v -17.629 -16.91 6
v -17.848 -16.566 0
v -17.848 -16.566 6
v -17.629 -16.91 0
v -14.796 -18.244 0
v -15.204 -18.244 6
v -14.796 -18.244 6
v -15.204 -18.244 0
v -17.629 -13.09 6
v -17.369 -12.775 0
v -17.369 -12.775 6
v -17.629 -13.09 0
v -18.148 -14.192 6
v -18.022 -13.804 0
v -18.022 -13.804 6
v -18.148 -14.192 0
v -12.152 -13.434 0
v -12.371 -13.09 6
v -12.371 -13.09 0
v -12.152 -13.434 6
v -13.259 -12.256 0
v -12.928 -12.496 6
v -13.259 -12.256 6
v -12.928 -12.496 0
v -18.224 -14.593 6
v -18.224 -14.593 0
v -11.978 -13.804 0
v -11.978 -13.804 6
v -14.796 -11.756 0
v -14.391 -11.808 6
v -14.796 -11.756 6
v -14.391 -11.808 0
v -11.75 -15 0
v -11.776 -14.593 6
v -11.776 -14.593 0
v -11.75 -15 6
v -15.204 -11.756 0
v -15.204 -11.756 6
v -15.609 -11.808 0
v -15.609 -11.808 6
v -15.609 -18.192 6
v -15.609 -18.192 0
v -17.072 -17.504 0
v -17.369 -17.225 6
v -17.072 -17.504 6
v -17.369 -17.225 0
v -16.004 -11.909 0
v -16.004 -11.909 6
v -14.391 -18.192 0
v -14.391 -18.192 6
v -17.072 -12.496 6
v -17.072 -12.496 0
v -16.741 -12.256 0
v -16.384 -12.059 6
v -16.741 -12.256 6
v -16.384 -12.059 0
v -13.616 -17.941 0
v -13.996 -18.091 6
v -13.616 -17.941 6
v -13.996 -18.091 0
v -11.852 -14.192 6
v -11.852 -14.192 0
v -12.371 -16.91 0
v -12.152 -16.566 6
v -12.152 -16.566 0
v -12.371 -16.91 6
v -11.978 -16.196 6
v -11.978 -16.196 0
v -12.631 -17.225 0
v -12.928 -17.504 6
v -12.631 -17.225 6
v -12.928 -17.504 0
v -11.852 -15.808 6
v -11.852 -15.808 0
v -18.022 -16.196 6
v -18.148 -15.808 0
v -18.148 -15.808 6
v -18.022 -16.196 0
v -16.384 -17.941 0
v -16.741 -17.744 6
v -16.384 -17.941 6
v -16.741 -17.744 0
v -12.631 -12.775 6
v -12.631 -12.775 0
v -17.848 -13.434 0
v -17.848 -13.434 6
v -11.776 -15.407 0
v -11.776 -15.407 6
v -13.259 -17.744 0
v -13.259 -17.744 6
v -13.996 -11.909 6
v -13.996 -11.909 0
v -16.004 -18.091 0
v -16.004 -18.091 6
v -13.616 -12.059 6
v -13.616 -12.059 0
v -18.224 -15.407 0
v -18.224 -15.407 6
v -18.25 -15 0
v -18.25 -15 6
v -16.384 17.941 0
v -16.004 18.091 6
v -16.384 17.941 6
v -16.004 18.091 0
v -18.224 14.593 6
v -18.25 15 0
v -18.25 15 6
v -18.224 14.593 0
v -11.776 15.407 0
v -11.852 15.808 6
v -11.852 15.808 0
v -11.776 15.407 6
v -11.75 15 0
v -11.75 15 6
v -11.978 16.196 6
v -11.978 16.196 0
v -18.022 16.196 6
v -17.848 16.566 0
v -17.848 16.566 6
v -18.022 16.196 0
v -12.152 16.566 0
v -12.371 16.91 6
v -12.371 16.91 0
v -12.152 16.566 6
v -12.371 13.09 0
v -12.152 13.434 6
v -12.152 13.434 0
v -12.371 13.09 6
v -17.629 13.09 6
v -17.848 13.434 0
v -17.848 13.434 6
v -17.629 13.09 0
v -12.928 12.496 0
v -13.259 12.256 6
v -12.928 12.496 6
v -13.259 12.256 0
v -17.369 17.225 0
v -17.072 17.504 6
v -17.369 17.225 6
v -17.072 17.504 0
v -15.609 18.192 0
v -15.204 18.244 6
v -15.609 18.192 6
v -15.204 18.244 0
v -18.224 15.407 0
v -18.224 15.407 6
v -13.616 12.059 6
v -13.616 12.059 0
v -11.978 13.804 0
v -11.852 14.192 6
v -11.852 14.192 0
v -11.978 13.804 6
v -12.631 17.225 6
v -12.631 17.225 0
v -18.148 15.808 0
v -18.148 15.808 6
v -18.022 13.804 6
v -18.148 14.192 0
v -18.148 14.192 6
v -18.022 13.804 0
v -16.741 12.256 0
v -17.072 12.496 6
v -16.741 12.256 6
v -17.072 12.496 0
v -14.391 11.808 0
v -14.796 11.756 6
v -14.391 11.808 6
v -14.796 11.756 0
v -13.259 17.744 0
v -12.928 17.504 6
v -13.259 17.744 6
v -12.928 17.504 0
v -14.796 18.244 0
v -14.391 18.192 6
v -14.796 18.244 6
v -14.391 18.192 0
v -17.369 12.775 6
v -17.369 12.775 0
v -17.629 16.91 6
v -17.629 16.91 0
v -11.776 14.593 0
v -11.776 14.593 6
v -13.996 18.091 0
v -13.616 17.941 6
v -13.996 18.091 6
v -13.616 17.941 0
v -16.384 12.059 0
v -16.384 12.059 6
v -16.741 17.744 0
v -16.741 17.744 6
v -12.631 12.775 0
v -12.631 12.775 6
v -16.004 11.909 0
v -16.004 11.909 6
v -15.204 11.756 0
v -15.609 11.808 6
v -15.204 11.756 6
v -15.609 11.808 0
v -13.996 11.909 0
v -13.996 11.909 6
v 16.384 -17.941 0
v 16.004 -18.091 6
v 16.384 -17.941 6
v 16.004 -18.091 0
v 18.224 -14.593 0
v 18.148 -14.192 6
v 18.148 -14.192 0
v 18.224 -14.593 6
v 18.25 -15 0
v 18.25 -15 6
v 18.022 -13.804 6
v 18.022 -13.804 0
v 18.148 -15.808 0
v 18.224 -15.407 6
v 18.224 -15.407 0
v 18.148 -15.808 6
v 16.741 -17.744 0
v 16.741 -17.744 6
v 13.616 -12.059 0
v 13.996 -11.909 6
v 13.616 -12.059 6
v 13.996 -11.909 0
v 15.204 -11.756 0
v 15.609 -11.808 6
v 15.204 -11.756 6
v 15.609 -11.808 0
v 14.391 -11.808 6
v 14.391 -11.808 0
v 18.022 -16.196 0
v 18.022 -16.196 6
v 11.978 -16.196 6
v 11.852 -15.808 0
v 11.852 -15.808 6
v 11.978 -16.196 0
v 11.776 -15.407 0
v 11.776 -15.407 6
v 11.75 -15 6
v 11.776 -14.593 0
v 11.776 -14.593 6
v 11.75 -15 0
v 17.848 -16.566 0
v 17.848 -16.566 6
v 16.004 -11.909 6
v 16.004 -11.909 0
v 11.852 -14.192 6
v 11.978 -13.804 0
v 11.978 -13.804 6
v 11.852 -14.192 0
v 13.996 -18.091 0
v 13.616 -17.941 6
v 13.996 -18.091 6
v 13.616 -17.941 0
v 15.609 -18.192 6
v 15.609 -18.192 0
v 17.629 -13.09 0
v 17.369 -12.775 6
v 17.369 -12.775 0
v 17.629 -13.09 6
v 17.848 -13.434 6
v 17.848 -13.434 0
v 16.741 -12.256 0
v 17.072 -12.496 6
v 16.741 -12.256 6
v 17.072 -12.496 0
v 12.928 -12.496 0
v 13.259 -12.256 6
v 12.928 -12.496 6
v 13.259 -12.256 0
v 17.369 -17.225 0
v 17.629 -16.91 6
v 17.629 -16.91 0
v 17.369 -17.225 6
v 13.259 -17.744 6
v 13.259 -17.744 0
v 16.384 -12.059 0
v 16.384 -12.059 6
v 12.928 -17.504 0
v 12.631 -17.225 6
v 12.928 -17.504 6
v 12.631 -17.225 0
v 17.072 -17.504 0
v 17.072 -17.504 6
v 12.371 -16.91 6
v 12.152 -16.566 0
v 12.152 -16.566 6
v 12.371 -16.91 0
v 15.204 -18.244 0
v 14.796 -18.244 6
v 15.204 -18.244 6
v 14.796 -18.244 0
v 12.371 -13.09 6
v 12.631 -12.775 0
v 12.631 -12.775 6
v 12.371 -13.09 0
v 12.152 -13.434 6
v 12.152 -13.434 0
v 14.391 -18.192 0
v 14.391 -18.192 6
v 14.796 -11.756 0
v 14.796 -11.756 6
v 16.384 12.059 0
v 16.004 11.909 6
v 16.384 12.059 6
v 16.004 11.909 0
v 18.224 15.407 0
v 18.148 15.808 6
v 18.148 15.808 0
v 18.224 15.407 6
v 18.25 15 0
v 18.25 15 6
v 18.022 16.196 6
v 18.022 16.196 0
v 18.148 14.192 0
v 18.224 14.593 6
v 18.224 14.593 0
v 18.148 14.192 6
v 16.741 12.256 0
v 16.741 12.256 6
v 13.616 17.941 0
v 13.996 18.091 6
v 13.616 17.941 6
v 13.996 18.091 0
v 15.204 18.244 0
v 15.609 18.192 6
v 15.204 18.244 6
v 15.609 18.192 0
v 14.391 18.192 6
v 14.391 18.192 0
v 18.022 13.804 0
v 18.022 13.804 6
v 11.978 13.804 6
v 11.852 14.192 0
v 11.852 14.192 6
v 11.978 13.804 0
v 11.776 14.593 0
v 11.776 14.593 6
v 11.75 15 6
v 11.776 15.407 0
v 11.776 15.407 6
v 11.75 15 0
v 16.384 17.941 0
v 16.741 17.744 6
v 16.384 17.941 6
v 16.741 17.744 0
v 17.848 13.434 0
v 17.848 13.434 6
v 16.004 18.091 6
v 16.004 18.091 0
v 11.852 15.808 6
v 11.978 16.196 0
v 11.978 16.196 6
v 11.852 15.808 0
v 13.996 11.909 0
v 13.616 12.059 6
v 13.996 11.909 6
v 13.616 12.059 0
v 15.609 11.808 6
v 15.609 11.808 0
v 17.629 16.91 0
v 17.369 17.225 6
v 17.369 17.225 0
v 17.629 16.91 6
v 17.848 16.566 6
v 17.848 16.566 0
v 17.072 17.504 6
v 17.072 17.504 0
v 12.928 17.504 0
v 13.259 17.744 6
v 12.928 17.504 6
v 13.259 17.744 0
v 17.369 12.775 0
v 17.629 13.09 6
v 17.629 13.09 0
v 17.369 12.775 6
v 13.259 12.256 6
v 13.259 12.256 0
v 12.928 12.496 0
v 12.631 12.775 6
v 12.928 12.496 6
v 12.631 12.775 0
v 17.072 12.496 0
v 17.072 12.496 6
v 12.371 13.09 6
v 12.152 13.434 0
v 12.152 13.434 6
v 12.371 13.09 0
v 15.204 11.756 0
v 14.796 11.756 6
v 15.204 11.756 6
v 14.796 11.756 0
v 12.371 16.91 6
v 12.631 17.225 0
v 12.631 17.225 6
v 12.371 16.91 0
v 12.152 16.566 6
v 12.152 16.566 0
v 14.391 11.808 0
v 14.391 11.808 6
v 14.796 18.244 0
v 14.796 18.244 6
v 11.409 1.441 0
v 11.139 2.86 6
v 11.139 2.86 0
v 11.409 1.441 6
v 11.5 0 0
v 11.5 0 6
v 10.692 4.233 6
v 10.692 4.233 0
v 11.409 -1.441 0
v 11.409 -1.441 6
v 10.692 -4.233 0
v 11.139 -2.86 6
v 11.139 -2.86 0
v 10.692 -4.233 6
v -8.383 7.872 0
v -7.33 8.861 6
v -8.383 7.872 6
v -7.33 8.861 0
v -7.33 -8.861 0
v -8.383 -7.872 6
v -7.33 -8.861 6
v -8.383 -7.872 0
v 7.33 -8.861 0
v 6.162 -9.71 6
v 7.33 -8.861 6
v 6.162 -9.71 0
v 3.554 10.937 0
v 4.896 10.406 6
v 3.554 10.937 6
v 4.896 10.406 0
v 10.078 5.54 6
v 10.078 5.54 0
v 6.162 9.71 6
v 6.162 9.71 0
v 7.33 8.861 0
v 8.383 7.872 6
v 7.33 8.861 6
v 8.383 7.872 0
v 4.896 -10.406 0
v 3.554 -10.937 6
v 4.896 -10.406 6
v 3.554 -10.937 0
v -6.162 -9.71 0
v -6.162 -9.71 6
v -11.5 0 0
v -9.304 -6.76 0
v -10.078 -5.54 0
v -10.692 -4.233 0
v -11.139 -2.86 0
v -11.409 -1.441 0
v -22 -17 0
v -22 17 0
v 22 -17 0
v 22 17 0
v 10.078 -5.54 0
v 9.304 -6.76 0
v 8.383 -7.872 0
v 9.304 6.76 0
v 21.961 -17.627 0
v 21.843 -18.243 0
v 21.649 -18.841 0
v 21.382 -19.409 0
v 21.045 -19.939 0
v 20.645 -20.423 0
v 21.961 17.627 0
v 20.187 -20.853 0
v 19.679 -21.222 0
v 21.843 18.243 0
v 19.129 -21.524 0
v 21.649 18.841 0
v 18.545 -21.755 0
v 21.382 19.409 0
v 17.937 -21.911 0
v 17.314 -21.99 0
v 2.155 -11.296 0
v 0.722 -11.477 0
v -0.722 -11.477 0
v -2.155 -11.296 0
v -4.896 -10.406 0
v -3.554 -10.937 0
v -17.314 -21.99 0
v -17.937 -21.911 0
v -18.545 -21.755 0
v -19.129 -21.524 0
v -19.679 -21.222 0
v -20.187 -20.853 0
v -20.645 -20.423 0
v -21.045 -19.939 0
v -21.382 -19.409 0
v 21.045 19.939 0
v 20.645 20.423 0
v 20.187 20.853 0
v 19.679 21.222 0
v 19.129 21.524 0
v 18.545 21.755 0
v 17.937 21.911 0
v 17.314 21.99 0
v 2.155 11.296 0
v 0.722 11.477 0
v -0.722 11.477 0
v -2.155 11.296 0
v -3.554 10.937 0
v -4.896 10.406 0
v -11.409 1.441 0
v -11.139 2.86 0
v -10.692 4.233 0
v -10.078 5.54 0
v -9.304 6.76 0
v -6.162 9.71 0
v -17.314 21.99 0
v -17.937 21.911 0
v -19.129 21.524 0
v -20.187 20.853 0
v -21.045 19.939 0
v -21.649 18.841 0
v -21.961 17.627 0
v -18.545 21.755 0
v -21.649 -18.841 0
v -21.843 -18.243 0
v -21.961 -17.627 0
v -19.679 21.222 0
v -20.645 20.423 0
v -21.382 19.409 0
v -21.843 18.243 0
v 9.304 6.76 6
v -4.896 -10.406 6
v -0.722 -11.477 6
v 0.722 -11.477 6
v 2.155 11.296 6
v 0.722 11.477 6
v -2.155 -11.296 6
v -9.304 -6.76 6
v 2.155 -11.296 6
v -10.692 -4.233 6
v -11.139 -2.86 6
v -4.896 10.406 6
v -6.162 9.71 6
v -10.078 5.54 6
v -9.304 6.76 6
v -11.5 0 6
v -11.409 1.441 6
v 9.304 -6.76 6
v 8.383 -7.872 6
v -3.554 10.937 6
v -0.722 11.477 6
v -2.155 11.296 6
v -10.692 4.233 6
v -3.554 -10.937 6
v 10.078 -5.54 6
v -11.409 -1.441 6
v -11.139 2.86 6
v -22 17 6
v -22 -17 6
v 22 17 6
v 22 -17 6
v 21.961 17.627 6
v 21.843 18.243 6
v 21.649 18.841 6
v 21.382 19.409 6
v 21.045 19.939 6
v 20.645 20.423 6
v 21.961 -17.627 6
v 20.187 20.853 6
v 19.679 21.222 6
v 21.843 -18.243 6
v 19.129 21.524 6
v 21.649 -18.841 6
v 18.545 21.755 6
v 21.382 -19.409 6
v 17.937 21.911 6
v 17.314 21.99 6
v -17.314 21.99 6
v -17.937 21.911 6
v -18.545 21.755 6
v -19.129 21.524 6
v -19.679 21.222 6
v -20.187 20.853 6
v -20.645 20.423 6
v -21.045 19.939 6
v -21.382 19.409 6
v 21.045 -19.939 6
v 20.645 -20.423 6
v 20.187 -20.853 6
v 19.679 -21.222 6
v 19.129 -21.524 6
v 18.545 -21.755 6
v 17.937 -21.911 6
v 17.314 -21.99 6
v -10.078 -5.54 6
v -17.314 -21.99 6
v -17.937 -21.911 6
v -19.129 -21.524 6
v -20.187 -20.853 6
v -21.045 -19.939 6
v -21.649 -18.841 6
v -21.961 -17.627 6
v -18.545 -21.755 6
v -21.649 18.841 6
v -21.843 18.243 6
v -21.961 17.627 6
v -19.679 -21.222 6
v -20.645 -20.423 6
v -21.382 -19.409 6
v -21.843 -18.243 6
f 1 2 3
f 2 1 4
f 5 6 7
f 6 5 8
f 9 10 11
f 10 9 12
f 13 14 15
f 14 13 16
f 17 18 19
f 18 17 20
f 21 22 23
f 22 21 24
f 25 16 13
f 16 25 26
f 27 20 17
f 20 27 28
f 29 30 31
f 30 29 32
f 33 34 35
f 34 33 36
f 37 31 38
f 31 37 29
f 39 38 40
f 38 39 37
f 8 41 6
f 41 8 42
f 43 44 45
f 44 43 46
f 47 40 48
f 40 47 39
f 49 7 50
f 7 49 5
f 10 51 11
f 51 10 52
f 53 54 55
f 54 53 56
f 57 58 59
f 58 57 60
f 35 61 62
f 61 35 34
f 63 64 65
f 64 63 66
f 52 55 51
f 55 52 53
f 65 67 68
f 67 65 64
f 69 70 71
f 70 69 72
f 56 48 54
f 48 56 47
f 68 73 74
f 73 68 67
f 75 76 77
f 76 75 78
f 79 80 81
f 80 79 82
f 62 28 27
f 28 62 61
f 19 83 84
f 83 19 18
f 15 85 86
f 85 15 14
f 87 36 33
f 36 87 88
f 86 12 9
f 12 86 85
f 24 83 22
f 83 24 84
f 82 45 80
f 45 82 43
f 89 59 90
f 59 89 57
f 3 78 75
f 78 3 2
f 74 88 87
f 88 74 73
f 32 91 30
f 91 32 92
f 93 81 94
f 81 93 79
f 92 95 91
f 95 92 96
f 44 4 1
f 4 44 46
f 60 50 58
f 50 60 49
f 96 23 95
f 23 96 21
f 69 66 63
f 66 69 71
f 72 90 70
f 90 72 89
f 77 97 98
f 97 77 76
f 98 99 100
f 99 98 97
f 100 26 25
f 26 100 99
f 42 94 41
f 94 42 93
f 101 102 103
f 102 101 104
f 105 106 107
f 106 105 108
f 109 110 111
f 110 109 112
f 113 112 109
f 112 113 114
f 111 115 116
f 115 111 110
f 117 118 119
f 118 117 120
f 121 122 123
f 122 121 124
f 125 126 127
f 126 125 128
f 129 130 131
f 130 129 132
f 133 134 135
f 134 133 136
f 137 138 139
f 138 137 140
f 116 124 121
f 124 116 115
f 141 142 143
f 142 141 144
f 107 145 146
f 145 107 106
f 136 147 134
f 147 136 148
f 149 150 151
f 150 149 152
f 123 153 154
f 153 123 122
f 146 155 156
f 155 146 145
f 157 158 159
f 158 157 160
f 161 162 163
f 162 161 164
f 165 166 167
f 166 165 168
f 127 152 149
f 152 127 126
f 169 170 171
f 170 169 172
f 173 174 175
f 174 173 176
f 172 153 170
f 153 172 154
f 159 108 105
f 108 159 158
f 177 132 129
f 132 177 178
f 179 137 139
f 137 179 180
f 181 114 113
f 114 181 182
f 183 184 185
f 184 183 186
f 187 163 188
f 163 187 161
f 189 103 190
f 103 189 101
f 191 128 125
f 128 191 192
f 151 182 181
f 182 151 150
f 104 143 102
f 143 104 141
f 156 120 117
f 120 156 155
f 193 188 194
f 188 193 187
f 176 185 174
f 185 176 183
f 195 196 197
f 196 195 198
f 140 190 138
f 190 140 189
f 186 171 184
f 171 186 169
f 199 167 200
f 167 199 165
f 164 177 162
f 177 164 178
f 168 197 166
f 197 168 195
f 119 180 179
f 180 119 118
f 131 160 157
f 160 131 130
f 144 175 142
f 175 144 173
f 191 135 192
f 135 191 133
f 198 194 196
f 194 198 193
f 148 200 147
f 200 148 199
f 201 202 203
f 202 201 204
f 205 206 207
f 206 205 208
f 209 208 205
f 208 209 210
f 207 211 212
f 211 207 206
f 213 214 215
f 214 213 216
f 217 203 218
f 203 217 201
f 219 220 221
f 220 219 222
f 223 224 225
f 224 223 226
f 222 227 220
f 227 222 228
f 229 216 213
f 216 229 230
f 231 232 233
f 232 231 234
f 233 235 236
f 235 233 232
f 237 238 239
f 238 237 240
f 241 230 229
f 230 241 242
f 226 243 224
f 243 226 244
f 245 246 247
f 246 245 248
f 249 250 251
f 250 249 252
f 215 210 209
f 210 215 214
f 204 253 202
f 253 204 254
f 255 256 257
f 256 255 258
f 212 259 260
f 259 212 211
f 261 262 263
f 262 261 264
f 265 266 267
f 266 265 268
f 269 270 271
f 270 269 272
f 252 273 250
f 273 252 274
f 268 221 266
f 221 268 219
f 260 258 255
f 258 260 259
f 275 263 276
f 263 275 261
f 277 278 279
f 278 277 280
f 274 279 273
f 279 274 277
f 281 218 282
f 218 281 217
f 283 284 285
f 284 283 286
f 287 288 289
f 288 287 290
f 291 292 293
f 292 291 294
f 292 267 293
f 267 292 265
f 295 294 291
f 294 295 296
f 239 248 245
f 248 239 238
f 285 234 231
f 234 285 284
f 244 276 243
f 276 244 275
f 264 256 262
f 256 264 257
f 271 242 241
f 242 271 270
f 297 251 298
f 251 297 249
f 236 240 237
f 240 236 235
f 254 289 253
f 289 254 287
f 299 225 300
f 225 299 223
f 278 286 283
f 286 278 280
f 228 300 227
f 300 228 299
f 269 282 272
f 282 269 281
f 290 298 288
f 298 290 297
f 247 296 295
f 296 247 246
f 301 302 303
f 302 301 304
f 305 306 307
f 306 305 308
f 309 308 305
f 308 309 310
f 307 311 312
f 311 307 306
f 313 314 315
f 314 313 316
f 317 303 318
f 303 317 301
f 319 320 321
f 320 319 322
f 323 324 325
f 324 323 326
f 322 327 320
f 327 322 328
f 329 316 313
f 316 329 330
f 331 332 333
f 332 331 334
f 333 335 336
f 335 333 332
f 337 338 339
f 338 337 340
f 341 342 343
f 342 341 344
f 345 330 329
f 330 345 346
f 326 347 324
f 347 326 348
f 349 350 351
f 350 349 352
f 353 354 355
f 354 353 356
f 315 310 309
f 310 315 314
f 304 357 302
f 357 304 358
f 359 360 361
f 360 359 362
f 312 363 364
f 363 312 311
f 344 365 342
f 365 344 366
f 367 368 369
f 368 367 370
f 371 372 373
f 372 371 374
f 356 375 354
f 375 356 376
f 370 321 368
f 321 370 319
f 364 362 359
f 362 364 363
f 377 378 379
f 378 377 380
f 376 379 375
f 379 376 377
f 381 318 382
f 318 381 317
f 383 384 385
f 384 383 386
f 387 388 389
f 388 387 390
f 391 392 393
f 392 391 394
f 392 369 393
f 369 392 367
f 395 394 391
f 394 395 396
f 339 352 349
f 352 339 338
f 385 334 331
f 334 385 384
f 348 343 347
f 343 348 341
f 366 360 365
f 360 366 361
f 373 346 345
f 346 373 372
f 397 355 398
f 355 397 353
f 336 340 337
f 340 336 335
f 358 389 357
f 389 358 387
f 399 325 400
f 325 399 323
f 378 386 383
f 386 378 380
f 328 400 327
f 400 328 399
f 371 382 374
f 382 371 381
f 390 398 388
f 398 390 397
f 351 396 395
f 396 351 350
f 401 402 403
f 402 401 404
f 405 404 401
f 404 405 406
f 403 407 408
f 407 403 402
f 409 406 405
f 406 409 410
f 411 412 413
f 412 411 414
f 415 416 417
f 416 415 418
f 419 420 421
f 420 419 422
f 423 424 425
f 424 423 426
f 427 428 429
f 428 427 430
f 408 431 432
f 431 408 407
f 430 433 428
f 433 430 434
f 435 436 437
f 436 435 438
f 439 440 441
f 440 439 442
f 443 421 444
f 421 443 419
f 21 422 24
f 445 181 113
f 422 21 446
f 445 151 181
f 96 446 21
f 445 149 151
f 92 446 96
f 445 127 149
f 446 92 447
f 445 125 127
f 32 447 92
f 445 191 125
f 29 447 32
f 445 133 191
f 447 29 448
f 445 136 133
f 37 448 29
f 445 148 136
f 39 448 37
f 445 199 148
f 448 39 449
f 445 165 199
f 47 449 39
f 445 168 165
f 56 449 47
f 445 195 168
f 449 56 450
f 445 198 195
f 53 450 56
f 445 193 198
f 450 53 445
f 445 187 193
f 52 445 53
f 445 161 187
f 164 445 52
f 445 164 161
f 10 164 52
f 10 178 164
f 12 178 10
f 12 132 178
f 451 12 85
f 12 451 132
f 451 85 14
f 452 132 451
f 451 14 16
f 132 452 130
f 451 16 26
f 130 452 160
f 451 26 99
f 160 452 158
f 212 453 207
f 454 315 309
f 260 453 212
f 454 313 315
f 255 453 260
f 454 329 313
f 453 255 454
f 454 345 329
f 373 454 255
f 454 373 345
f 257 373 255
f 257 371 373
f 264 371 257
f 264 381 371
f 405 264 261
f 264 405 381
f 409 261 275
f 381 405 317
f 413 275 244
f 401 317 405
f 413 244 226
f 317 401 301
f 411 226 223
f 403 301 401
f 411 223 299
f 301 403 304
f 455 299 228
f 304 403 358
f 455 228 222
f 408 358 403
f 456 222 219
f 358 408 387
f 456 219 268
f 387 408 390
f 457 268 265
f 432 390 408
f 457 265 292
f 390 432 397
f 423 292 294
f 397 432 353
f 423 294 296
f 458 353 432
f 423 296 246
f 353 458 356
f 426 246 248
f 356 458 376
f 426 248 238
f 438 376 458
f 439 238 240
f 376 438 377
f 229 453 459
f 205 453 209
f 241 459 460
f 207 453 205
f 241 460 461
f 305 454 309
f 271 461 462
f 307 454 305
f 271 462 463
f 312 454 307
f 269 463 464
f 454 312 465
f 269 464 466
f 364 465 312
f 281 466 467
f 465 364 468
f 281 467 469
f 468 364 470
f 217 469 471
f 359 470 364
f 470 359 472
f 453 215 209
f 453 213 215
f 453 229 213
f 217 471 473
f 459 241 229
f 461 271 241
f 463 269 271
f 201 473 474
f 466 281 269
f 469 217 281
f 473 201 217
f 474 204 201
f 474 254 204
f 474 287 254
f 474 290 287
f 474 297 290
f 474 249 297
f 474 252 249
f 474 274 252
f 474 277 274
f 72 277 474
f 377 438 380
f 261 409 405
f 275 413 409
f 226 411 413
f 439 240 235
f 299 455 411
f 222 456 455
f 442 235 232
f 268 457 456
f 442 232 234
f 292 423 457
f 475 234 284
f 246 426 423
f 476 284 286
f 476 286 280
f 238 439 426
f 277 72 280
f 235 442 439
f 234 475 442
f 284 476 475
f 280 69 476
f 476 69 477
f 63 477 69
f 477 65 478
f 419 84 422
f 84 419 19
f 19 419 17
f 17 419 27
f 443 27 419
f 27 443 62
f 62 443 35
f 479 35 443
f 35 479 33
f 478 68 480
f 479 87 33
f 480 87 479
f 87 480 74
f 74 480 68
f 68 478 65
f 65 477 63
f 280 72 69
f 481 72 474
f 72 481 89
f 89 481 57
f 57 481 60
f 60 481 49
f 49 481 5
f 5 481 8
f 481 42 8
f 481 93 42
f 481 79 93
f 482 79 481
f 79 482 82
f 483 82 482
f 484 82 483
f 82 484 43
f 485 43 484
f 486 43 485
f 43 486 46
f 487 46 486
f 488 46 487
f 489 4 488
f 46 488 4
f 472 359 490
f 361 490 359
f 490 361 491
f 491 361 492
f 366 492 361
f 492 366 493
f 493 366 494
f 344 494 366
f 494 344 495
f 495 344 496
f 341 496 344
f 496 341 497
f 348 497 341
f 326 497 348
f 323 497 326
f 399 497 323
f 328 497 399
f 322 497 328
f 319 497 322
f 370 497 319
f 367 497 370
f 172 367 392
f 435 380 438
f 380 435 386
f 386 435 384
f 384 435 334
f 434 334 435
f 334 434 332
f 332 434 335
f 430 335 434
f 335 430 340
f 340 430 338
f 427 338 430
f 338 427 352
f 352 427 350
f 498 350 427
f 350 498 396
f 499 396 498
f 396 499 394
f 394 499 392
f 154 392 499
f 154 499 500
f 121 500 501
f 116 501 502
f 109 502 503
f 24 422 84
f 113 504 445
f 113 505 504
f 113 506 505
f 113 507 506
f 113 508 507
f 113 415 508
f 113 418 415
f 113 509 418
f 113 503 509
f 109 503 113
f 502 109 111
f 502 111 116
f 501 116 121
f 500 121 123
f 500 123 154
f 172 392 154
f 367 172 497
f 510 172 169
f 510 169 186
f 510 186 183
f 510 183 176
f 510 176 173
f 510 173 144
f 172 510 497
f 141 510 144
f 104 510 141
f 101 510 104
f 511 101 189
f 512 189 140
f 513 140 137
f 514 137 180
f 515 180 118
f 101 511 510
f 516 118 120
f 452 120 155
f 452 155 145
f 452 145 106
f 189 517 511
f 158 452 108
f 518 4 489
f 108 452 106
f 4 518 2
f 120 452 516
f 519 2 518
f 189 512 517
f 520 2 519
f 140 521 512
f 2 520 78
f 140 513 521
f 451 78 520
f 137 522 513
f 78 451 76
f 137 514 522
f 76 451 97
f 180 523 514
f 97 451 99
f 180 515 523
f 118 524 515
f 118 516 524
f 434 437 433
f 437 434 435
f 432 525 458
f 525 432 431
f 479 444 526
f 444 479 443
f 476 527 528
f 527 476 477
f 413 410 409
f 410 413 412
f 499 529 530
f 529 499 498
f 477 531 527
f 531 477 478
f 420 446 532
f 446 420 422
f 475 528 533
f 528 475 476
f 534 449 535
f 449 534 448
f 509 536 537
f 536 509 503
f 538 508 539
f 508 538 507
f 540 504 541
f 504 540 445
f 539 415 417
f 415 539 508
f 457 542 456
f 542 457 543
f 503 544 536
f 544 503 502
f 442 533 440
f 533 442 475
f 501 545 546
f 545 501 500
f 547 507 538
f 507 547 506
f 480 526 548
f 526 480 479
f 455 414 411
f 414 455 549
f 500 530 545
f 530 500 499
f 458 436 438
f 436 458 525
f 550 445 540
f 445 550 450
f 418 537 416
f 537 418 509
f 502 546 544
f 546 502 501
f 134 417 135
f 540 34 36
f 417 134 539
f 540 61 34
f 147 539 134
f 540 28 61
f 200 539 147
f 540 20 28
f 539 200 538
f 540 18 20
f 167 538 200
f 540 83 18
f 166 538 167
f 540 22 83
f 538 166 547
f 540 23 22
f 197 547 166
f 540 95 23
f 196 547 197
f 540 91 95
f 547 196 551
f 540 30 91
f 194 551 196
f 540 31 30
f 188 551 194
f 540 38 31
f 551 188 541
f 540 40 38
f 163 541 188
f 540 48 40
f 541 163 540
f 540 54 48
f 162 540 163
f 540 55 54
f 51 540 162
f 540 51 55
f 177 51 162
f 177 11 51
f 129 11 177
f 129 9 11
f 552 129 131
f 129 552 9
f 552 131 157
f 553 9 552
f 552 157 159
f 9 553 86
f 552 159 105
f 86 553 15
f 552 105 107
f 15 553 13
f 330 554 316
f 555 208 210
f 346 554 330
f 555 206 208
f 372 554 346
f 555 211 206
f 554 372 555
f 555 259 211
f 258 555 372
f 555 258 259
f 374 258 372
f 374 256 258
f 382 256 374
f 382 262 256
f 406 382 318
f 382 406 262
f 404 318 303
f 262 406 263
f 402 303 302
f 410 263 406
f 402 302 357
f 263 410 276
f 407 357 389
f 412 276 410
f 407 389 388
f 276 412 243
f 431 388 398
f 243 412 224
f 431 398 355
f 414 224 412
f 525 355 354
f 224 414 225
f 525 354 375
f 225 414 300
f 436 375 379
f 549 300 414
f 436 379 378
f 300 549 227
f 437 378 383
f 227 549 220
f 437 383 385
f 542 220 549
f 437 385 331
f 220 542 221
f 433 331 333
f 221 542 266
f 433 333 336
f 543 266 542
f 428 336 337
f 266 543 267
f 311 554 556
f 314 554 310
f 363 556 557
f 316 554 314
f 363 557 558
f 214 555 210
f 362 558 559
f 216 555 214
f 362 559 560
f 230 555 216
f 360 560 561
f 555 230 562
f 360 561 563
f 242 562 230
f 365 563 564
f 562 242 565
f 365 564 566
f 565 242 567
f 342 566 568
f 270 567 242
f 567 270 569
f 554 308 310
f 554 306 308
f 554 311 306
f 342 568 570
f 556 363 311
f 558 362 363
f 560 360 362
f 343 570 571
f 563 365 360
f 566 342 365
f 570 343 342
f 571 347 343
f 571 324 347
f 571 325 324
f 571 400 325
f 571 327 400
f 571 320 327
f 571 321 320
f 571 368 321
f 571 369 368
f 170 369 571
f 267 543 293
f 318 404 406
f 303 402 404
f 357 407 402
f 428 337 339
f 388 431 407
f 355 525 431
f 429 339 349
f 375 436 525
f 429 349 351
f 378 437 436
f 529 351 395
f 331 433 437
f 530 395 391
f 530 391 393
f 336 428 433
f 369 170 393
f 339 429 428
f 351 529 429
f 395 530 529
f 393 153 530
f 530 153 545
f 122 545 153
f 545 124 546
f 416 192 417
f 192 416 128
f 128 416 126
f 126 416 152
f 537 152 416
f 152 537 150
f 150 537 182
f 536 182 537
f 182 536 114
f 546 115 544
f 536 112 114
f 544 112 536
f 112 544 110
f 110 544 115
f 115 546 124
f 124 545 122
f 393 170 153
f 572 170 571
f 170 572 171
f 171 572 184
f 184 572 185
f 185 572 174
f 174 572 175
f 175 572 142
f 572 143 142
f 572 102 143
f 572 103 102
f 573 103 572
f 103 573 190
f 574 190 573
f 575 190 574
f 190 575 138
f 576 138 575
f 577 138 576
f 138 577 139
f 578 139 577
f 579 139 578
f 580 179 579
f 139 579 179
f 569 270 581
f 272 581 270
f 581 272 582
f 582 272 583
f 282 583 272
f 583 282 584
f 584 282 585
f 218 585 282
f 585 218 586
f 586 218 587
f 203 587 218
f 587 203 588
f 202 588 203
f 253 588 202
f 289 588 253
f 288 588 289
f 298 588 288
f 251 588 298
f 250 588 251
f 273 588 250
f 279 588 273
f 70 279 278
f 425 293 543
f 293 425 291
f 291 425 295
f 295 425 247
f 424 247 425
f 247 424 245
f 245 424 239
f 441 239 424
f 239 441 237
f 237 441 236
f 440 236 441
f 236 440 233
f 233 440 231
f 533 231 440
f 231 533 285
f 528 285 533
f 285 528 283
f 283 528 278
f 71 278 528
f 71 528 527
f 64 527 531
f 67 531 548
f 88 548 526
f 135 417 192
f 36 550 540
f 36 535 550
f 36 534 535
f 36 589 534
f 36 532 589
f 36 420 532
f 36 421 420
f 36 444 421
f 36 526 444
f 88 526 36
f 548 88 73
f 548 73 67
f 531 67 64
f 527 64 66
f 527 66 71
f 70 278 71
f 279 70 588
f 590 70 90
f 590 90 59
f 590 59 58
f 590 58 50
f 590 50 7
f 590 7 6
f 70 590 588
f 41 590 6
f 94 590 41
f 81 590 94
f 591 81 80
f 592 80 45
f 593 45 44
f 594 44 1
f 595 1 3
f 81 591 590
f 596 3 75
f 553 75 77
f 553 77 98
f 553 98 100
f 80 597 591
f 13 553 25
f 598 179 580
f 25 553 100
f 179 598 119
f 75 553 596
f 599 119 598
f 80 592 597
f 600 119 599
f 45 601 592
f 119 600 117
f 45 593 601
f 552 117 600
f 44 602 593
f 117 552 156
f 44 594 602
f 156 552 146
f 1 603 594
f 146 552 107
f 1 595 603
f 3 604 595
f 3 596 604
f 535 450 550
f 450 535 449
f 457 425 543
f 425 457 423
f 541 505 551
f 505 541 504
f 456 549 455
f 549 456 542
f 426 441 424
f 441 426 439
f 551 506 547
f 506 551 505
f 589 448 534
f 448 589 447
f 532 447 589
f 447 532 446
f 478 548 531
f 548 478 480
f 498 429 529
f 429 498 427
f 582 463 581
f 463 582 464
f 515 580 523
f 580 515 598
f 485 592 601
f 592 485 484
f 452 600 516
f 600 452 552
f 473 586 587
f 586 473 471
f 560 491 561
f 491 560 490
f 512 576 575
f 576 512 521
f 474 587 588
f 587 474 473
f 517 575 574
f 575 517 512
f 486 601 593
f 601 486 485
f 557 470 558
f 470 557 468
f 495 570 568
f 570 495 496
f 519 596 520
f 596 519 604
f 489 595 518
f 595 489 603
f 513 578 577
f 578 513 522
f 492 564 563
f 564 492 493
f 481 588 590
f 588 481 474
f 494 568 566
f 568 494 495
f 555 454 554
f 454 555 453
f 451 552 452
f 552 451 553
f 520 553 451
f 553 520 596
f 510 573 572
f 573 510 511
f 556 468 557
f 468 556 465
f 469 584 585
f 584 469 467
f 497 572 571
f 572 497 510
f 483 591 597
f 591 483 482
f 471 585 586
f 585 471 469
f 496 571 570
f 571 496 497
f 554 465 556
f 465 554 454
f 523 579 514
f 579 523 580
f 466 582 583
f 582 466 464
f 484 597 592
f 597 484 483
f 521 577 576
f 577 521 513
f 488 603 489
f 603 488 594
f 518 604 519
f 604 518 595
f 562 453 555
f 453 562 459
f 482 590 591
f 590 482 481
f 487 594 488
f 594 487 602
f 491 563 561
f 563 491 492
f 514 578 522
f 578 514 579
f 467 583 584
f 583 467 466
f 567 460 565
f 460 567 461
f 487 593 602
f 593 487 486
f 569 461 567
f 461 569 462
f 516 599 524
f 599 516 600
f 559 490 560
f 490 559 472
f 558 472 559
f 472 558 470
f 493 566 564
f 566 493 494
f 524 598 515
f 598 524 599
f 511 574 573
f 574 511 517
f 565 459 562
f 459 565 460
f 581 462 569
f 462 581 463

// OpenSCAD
$fn = 50;


difference() {
	union() {
		hull() {
			translate(v = [-17.0000000000, 17.0000000000, 0]) {
				cylinder(h = 6, r = 5);
			}
			translate(v = [17.0000000000, 17.0000000000, 0]) {
				cylinder(h = 6, r = 5);
			}
			translate(v = [-17.0000000000, -17.0000000000, 0]) {
				cylinder(h = 6, r = 5);
			}
			translate(v = [17.0000000000, -17.0000000000, 0]) {
				cylinder(h = 6, r = 5);
			}
		}
	}
	union() {
		#translate(v = [-15.0000000000, -15.0000000000, -100.0000000000]) {
			cylinder(h = 200, r = 3.2500000000);
		}
		#translate(v = [-15.0000000000, 15.0000000000, -100.0000000000]) {
			cylinder(h = 200, r = 3.2500000000);
		}
		#translate(v = [15.0000000000, -15.0000000000, -100.0000000000]) {
			cylinder(h = 200, r = 3.2500000000);
		}
		#translate(v = [15.0000000000, 15.0000000000, -100.0000000000]) {
			cylinder(h = 200, r = 3.2500000000);
		}
		#cylinder(h = 6, r = 11.5000000000);
	}
}
